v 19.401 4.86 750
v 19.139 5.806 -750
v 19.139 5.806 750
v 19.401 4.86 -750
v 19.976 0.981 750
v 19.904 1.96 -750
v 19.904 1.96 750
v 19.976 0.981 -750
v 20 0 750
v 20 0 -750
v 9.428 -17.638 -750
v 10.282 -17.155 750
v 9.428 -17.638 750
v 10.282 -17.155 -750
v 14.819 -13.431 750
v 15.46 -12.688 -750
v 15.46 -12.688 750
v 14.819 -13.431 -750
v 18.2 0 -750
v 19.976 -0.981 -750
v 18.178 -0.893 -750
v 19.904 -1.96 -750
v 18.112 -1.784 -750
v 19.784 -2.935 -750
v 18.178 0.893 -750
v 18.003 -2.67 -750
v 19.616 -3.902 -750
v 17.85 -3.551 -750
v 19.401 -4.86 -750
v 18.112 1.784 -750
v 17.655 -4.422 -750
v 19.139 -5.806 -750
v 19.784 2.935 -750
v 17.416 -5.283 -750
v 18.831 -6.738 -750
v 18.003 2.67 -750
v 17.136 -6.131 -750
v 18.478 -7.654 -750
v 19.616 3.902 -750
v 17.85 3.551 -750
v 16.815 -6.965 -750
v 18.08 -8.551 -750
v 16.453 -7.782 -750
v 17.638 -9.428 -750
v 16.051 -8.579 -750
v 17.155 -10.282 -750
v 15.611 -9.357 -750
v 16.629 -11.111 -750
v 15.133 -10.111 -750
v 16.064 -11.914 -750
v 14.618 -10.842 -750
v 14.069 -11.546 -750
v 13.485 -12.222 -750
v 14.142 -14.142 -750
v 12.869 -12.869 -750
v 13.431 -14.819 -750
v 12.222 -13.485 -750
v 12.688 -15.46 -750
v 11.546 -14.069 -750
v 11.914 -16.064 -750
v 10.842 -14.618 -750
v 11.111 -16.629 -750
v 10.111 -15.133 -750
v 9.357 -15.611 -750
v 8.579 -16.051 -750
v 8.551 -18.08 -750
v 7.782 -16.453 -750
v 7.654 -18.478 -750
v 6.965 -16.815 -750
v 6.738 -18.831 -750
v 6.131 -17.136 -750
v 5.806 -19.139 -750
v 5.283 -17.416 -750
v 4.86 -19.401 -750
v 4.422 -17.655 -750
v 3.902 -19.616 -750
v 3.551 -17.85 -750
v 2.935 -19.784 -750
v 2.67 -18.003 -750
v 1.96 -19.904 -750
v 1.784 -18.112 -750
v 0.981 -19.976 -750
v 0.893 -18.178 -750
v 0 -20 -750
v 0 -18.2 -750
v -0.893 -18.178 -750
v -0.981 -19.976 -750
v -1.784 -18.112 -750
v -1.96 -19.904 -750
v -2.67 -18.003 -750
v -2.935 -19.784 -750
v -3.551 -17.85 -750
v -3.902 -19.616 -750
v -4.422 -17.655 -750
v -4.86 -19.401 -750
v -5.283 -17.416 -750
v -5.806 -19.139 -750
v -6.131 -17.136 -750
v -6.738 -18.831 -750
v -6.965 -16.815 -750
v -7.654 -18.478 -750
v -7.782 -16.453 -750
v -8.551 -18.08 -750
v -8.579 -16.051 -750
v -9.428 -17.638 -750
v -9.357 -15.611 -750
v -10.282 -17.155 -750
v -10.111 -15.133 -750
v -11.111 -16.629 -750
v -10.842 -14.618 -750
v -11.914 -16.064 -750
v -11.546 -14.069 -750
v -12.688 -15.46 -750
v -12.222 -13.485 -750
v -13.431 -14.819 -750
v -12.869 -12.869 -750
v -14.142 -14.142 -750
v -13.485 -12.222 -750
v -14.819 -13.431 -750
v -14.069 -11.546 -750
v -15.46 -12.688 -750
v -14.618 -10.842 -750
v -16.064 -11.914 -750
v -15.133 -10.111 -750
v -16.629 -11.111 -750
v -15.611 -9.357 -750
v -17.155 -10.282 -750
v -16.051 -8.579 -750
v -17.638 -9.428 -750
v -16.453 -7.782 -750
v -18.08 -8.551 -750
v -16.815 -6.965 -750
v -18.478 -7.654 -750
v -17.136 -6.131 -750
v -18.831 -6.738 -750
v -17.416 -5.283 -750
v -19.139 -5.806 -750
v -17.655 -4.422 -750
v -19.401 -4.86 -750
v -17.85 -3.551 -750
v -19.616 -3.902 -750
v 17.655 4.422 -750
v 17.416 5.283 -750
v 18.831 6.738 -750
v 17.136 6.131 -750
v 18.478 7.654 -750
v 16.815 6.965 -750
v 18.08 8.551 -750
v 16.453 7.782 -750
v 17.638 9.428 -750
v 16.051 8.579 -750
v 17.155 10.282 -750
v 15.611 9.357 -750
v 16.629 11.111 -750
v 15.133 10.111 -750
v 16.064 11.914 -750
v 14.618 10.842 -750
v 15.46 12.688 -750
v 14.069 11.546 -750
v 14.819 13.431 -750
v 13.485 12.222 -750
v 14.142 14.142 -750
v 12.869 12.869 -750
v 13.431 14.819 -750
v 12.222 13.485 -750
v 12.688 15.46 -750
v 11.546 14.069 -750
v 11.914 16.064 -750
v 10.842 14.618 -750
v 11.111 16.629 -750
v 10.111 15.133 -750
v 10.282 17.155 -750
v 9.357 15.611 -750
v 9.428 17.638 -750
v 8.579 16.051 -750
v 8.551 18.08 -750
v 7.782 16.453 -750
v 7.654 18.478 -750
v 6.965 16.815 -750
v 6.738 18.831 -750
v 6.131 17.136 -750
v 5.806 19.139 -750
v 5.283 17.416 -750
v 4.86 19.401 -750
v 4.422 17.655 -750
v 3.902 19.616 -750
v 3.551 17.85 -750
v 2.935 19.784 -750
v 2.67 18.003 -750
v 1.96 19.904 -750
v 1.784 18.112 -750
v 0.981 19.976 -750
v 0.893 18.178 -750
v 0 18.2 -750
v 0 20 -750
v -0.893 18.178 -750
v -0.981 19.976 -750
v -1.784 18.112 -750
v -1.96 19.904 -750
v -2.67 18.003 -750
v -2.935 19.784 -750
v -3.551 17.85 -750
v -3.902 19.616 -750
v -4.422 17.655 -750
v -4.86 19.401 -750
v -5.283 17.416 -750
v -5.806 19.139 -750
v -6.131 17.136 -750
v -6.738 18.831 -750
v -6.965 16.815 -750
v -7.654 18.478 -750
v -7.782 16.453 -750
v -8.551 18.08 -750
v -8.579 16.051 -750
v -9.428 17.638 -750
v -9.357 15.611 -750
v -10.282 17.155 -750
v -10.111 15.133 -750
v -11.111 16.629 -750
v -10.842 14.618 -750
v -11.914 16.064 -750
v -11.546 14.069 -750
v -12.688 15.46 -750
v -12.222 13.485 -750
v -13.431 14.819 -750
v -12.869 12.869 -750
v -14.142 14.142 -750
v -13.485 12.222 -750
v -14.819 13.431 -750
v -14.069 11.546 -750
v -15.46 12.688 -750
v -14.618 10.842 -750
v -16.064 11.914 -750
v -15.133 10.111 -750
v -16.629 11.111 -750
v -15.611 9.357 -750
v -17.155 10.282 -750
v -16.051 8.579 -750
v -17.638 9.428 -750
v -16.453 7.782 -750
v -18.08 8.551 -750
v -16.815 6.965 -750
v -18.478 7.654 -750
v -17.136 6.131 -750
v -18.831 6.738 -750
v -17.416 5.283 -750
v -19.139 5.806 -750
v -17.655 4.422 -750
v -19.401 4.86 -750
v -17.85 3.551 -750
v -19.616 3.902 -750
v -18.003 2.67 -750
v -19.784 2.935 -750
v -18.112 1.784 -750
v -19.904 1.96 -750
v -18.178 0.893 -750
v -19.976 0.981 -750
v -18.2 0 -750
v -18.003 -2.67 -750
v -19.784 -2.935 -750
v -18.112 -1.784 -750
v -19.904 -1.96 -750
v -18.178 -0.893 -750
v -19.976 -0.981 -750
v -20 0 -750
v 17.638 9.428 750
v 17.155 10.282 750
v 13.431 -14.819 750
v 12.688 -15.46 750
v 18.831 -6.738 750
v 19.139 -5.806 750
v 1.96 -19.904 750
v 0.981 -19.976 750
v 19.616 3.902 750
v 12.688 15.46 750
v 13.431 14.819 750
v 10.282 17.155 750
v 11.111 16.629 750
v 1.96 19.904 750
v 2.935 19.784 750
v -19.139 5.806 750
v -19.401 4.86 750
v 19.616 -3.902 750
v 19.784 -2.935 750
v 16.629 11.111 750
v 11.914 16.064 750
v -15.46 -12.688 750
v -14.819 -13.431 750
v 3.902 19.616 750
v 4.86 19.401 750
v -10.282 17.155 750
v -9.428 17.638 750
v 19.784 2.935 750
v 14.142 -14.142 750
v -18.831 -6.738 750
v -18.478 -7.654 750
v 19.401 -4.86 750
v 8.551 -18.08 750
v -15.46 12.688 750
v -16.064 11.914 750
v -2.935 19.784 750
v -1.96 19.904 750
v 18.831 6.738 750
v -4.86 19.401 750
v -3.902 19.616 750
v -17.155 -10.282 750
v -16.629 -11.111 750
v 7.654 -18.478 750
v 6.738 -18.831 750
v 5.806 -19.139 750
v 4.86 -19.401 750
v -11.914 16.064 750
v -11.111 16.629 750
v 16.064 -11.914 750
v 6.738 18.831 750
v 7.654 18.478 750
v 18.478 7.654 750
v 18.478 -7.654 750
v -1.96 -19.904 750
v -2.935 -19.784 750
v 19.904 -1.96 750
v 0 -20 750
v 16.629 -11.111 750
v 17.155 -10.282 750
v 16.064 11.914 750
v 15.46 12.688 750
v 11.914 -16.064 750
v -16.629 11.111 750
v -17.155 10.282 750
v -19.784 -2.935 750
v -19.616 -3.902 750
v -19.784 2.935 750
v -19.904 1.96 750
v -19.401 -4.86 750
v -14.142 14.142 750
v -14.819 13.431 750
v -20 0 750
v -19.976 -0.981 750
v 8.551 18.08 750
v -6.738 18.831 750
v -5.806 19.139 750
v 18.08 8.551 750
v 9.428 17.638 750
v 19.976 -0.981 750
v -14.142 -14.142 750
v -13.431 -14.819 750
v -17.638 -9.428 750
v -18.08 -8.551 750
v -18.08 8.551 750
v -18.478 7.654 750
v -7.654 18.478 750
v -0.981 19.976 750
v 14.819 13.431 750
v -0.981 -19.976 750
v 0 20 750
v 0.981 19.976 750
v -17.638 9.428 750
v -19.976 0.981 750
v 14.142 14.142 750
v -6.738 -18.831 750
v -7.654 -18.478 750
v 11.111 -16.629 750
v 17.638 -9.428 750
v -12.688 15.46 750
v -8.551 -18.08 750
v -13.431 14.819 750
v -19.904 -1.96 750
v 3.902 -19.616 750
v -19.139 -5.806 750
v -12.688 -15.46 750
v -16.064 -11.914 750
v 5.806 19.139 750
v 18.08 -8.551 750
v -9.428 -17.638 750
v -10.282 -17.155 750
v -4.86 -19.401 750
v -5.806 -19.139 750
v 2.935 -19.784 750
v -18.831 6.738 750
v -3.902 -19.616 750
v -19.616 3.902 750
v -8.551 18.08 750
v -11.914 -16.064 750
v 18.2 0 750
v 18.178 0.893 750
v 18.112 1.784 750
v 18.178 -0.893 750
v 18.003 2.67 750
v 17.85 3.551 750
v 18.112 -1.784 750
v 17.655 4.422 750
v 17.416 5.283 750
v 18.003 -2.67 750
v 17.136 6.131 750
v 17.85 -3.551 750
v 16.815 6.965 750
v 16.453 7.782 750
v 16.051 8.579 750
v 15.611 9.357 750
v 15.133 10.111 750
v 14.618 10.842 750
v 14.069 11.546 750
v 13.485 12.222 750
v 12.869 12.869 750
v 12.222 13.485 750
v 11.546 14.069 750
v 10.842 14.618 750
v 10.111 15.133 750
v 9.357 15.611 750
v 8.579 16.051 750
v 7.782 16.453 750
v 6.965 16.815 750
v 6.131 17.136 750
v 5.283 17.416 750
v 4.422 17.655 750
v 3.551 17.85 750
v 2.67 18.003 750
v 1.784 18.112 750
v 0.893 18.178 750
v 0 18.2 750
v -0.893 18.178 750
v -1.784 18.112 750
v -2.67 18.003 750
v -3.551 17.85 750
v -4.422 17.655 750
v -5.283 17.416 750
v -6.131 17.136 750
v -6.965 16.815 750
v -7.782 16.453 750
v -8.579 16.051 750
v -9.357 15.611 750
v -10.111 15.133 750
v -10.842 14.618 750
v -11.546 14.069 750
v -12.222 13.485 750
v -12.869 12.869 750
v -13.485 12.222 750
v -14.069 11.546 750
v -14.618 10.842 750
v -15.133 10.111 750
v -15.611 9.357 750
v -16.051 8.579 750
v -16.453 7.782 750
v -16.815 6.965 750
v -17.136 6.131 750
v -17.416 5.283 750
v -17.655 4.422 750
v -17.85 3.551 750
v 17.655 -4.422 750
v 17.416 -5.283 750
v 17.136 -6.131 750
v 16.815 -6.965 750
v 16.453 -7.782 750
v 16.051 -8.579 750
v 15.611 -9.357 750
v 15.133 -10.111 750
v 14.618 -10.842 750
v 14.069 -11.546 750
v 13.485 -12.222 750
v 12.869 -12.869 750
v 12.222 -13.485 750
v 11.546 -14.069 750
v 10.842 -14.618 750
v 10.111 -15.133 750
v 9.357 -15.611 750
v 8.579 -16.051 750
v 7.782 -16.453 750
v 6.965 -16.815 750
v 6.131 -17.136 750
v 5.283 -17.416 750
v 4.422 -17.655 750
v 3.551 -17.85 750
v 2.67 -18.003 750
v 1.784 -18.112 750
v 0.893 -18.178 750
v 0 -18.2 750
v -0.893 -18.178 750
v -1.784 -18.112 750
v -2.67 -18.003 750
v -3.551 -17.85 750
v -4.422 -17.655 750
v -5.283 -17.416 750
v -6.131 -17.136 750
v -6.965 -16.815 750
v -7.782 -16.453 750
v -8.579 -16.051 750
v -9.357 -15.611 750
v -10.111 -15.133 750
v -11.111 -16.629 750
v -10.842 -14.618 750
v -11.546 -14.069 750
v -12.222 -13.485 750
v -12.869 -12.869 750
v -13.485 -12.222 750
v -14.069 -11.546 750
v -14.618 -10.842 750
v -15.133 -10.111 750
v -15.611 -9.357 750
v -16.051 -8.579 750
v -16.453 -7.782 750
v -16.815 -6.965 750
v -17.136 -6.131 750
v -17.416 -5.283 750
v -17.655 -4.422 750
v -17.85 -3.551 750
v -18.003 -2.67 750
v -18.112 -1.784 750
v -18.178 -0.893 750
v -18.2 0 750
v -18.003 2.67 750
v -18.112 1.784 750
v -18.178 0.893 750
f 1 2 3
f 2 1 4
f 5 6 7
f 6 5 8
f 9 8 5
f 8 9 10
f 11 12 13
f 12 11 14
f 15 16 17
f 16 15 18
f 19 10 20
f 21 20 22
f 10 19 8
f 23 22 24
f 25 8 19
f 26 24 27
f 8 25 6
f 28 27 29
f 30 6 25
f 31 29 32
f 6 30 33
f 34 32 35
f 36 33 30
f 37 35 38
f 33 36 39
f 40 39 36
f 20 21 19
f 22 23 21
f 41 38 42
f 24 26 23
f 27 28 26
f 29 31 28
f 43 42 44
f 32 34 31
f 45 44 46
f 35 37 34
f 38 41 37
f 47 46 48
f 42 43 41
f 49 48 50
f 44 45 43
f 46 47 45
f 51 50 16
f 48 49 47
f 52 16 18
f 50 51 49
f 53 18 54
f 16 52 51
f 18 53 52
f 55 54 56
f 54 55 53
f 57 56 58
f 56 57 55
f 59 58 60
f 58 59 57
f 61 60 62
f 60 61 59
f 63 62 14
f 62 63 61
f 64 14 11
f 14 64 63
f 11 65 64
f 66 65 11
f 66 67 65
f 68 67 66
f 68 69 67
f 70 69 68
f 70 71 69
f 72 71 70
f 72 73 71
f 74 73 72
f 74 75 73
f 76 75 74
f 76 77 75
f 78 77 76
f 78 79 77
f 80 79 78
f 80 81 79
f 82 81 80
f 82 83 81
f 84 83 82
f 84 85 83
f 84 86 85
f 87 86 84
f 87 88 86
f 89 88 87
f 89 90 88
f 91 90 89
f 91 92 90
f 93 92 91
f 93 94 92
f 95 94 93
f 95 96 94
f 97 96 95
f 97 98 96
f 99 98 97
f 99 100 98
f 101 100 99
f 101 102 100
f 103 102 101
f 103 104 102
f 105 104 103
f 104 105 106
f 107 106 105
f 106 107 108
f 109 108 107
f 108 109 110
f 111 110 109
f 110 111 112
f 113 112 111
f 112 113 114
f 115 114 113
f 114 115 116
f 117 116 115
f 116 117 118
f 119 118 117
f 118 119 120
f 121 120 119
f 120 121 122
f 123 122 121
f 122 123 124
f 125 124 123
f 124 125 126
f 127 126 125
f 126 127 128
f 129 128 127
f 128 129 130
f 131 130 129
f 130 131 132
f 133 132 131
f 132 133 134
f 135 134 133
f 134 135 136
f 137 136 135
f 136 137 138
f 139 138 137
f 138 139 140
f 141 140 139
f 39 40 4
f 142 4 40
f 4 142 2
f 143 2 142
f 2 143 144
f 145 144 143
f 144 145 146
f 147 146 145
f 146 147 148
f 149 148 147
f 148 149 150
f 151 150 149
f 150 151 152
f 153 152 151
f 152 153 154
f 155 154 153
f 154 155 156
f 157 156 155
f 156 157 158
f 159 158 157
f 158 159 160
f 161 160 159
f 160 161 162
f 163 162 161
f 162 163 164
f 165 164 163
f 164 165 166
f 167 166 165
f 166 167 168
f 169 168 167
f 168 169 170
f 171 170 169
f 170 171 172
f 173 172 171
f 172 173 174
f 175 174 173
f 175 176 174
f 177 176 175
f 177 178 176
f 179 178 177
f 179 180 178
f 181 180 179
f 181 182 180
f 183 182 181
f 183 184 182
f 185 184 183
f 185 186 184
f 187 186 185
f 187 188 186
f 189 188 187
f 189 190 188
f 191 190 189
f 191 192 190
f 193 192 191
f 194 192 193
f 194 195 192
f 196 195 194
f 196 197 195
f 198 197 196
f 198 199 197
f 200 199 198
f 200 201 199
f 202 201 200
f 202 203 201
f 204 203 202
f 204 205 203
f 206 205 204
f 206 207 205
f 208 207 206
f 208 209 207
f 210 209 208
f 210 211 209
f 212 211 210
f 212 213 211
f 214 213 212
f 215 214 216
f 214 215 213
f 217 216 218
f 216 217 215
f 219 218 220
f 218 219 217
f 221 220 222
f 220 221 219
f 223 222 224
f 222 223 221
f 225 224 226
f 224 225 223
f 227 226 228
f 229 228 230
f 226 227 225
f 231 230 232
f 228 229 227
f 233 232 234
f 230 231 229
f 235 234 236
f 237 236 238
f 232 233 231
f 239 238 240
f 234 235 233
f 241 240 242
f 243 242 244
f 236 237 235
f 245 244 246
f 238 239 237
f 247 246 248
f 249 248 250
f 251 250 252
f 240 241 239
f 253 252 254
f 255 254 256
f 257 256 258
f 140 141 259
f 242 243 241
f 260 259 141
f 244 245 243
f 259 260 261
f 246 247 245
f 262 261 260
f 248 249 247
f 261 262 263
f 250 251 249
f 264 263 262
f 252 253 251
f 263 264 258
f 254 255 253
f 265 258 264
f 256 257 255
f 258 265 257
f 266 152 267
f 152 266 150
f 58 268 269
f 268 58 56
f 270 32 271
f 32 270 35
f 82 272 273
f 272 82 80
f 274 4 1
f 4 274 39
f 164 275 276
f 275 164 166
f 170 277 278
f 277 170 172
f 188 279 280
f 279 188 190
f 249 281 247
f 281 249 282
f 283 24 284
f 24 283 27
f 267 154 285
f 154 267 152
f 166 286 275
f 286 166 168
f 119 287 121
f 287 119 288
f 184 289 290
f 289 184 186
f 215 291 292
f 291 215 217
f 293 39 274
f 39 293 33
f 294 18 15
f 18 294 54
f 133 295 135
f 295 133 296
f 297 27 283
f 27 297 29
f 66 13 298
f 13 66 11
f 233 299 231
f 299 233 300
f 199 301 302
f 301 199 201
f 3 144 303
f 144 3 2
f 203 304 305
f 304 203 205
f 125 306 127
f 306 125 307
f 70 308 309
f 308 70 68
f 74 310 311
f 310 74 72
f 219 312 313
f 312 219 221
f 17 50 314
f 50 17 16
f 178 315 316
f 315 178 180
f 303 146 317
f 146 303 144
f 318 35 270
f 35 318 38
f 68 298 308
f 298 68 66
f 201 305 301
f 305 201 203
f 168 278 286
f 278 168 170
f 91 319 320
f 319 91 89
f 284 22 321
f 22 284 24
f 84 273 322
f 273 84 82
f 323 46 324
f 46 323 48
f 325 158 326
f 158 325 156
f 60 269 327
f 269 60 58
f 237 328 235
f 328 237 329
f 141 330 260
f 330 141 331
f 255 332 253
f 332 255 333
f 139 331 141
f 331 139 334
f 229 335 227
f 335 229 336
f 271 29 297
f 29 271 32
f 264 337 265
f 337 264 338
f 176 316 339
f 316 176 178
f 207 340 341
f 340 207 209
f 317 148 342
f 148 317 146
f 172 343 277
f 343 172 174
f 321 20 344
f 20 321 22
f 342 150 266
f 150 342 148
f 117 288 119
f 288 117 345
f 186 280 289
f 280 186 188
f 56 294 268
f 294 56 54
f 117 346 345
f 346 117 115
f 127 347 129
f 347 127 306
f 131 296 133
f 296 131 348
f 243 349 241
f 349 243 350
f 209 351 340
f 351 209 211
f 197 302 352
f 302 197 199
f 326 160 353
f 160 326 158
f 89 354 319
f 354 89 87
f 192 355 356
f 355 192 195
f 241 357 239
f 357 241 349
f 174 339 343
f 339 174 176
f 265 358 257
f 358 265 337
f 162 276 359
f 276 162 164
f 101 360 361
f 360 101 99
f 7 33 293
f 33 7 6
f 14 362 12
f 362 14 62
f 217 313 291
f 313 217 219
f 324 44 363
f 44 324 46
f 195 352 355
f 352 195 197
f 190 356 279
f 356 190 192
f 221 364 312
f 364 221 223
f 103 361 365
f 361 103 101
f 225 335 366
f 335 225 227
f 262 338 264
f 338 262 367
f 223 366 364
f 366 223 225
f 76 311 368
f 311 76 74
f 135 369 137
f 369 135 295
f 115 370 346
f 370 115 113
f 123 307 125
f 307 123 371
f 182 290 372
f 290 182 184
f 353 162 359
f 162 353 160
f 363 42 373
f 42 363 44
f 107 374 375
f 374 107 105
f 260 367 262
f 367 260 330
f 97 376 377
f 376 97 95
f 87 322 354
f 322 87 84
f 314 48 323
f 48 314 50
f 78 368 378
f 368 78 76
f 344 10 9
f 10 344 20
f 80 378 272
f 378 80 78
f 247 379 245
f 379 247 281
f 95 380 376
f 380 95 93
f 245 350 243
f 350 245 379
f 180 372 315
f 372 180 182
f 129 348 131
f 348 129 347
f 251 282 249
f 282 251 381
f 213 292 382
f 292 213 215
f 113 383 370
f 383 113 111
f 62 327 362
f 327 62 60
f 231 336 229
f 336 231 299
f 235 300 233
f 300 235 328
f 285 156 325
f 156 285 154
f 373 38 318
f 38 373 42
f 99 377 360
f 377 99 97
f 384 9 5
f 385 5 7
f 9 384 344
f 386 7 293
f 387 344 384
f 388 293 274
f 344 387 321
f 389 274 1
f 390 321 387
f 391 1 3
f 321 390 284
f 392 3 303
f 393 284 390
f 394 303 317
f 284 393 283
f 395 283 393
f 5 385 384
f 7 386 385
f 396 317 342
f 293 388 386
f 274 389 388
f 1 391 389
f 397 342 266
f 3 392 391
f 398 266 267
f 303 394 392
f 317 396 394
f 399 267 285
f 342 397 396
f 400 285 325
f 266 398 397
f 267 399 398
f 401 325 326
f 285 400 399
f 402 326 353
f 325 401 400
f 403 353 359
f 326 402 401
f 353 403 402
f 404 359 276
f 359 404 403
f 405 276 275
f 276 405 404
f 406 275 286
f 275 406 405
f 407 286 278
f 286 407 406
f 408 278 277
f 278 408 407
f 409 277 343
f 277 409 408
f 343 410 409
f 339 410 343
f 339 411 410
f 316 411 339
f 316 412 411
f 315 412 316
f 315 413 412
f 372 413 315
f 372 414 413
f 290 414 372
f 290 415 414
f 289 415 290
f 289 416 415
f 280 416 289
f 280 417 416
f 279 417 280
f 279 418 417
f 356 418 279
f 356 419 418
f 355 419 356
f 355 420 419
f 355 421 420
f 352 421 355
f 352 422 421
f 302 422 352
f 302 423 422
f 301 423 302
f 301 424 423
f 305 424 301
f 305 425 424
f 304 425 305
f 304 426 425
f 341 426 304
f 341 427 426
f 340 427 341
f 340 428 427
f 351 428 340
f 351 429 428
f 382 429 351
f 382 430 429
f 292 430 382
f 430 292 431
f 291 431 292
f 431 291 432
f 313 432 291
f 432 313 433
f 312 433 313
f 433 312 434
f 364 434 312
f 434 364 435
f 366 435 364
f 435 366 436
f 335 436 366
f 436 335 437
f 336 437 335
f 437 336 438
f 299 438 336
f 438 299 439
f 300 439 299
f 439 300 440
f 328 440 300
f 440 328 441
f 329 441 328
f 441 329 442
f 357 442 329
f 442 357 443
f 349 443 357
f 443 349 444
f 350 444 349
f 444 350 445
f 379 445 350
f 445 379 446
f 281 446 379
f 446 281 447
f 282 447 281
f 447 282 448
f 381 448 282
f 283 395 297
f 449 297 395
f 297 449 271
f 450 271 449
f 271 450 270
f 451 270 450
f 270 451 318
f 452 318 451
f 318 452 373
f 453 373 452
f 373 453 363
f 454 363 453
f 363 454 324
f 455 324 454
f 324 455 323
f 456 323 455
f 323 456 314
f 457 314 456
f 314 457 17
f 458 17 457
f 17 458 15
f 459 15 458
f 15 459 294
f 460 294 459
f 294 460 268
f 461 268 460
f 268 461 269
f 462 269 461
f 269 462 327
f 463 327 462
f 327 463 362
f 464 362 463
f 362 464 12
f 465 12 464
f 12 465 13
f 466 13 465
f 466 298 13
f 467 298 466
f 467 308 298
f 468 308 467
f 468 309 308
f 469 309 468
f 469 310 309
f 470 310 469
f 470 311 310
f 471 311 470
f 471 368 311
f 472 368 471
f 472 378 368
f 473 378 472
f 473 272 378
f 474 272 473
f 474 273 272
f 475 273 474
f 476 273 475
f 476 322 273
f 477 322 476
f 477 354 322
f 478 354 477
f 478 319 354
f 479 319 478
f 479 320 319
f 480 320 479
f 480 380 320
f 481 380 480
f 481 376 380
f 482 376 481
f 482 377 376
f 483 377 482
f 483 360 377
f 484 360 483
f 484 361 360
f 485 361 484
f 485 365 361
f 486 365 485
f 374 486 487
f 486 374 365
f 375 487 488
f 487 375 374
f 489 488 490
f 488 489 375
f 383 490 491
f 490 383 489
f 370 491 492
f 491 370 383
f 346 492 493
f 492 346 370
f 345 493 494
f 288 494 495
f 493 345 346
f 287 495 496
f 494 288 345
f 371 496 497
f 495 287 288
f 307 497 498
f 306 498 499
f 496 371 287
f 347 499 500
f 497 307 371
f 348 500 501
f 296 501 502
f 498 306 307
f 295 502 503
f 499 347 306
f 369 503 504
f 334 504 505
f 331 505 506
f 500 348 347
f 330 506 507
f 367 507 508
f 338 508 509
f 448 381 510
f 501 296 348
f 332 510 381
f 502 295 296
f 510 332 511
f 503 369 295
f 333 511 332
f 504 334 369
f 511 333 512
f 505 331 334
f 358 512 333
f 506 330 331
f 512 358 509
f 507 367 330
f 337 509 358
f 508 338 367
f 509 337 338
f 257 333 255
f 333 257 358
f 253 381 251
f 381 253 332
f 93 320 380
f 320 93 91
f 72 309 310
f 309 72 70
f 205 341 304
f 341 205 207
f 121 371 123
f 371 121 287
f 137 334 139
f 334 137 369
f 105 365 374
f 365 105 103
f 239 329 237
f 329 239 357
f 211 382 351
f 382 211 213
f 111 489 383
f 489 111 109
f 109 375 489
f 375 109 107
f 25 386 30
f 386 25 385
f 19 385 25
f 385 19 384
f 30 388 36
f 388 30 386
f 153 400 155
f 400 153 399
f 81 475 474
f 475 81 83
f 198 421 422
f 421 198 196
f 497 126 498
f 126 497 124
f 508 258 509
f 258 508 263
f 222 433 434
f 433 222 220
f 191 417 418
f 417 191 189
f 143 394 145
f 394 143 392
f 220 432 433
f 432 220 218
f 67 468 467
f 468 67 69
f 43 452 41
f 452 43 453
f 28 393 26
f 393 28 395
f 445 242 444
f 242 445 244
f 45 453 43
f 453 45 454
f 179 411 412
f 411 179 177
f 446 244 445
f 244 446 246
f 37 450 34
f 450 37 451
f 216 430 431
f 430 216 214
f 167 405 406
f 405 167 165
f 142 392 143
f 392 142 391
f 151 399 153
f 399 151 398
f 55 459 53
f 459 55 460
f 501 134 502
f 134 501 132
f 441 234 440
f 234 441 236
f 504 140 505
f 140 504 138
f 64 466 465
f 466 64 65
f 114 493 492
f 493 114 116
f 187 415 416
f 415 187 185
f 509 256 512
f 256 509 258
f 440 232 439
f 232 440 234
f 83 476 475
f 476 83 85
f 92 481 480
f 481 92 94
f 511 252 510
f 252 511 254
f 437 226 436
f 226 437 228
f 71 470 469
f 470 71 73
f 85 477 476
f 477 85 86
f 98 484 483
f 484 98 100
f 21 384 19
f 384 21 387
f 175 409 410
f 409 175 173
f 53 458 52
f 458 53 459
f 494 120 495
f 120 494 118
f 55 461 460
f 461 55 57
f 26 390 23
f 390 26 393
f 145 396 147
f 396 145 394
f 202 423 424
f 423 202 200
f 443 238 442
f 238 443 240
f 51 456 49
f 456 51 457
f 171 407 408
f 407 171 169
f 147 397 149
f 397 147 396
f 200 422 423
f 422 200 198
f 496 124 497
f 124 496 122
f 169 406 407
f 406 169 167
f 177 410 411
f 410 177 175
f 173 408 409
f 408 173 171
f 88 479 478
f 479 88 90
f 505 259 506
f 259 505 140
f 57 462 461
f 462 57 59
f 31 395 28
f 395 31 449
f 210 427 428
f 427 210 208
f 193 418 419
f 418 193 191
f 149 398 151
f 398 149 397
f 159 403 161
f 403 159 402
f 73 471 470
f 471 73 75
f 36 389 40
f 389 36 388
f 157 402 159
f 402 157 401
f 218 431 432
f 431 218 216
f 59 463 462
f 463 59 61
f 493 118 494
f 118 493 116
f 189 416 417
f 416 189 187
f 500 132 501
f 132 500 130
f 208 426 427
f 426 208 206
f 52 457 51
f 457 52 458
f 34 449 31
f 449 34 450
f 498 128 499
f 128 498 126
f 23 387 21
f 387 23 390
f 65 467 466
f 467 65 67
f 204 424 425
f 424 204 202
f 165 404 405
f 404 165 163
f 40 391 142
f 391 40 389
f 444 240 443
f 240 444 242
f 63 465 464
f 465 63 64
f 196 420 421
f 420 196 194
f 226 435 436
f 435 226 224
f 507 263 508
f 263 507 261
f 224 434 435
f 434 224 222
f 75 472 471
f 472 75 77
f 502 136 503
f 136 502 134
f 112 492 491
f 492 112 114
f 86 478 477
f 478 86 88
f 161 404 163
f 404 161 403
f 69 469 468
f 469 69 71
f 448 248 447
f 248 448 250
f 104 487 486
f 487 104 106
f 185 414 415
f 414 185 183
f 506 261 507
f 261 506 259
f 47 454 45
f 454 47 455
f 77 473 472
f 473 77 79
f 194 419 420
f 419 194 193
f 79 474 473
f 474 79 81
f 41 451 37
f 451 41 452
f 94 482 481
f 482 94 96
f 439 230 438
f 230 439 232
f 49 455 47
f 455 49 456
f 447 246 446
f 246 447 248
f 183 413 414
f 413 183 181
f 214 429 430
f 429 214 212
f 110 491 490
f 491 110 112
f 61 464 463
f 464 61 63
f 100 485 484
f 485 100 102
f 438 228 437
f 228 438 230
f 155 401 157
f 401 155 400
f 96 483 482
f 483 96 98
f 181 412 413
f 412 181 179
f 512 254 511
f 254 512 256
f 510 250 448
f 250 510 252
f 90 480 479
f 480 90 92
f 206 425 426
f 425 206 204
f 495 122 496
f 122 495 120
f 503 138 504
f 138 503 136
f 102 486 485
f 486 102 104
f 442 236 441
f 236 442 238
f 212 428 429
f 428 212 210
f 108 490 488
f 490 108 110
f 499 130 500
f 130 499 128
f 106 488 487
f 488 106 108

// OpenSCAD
$fn=128;

pipe_length = 1500;
od = 40;
wall = 1.8;
id = od - 2*wall;

module ht_pipe(len, outer_d, inner_d){
    difference(){
        cylinder(h=len, d=outer_d, center=true);
        cylinder(h=len+2, d=inner_d, center=true);
    }
}

ht_pipe(pipe_length, od, id);
